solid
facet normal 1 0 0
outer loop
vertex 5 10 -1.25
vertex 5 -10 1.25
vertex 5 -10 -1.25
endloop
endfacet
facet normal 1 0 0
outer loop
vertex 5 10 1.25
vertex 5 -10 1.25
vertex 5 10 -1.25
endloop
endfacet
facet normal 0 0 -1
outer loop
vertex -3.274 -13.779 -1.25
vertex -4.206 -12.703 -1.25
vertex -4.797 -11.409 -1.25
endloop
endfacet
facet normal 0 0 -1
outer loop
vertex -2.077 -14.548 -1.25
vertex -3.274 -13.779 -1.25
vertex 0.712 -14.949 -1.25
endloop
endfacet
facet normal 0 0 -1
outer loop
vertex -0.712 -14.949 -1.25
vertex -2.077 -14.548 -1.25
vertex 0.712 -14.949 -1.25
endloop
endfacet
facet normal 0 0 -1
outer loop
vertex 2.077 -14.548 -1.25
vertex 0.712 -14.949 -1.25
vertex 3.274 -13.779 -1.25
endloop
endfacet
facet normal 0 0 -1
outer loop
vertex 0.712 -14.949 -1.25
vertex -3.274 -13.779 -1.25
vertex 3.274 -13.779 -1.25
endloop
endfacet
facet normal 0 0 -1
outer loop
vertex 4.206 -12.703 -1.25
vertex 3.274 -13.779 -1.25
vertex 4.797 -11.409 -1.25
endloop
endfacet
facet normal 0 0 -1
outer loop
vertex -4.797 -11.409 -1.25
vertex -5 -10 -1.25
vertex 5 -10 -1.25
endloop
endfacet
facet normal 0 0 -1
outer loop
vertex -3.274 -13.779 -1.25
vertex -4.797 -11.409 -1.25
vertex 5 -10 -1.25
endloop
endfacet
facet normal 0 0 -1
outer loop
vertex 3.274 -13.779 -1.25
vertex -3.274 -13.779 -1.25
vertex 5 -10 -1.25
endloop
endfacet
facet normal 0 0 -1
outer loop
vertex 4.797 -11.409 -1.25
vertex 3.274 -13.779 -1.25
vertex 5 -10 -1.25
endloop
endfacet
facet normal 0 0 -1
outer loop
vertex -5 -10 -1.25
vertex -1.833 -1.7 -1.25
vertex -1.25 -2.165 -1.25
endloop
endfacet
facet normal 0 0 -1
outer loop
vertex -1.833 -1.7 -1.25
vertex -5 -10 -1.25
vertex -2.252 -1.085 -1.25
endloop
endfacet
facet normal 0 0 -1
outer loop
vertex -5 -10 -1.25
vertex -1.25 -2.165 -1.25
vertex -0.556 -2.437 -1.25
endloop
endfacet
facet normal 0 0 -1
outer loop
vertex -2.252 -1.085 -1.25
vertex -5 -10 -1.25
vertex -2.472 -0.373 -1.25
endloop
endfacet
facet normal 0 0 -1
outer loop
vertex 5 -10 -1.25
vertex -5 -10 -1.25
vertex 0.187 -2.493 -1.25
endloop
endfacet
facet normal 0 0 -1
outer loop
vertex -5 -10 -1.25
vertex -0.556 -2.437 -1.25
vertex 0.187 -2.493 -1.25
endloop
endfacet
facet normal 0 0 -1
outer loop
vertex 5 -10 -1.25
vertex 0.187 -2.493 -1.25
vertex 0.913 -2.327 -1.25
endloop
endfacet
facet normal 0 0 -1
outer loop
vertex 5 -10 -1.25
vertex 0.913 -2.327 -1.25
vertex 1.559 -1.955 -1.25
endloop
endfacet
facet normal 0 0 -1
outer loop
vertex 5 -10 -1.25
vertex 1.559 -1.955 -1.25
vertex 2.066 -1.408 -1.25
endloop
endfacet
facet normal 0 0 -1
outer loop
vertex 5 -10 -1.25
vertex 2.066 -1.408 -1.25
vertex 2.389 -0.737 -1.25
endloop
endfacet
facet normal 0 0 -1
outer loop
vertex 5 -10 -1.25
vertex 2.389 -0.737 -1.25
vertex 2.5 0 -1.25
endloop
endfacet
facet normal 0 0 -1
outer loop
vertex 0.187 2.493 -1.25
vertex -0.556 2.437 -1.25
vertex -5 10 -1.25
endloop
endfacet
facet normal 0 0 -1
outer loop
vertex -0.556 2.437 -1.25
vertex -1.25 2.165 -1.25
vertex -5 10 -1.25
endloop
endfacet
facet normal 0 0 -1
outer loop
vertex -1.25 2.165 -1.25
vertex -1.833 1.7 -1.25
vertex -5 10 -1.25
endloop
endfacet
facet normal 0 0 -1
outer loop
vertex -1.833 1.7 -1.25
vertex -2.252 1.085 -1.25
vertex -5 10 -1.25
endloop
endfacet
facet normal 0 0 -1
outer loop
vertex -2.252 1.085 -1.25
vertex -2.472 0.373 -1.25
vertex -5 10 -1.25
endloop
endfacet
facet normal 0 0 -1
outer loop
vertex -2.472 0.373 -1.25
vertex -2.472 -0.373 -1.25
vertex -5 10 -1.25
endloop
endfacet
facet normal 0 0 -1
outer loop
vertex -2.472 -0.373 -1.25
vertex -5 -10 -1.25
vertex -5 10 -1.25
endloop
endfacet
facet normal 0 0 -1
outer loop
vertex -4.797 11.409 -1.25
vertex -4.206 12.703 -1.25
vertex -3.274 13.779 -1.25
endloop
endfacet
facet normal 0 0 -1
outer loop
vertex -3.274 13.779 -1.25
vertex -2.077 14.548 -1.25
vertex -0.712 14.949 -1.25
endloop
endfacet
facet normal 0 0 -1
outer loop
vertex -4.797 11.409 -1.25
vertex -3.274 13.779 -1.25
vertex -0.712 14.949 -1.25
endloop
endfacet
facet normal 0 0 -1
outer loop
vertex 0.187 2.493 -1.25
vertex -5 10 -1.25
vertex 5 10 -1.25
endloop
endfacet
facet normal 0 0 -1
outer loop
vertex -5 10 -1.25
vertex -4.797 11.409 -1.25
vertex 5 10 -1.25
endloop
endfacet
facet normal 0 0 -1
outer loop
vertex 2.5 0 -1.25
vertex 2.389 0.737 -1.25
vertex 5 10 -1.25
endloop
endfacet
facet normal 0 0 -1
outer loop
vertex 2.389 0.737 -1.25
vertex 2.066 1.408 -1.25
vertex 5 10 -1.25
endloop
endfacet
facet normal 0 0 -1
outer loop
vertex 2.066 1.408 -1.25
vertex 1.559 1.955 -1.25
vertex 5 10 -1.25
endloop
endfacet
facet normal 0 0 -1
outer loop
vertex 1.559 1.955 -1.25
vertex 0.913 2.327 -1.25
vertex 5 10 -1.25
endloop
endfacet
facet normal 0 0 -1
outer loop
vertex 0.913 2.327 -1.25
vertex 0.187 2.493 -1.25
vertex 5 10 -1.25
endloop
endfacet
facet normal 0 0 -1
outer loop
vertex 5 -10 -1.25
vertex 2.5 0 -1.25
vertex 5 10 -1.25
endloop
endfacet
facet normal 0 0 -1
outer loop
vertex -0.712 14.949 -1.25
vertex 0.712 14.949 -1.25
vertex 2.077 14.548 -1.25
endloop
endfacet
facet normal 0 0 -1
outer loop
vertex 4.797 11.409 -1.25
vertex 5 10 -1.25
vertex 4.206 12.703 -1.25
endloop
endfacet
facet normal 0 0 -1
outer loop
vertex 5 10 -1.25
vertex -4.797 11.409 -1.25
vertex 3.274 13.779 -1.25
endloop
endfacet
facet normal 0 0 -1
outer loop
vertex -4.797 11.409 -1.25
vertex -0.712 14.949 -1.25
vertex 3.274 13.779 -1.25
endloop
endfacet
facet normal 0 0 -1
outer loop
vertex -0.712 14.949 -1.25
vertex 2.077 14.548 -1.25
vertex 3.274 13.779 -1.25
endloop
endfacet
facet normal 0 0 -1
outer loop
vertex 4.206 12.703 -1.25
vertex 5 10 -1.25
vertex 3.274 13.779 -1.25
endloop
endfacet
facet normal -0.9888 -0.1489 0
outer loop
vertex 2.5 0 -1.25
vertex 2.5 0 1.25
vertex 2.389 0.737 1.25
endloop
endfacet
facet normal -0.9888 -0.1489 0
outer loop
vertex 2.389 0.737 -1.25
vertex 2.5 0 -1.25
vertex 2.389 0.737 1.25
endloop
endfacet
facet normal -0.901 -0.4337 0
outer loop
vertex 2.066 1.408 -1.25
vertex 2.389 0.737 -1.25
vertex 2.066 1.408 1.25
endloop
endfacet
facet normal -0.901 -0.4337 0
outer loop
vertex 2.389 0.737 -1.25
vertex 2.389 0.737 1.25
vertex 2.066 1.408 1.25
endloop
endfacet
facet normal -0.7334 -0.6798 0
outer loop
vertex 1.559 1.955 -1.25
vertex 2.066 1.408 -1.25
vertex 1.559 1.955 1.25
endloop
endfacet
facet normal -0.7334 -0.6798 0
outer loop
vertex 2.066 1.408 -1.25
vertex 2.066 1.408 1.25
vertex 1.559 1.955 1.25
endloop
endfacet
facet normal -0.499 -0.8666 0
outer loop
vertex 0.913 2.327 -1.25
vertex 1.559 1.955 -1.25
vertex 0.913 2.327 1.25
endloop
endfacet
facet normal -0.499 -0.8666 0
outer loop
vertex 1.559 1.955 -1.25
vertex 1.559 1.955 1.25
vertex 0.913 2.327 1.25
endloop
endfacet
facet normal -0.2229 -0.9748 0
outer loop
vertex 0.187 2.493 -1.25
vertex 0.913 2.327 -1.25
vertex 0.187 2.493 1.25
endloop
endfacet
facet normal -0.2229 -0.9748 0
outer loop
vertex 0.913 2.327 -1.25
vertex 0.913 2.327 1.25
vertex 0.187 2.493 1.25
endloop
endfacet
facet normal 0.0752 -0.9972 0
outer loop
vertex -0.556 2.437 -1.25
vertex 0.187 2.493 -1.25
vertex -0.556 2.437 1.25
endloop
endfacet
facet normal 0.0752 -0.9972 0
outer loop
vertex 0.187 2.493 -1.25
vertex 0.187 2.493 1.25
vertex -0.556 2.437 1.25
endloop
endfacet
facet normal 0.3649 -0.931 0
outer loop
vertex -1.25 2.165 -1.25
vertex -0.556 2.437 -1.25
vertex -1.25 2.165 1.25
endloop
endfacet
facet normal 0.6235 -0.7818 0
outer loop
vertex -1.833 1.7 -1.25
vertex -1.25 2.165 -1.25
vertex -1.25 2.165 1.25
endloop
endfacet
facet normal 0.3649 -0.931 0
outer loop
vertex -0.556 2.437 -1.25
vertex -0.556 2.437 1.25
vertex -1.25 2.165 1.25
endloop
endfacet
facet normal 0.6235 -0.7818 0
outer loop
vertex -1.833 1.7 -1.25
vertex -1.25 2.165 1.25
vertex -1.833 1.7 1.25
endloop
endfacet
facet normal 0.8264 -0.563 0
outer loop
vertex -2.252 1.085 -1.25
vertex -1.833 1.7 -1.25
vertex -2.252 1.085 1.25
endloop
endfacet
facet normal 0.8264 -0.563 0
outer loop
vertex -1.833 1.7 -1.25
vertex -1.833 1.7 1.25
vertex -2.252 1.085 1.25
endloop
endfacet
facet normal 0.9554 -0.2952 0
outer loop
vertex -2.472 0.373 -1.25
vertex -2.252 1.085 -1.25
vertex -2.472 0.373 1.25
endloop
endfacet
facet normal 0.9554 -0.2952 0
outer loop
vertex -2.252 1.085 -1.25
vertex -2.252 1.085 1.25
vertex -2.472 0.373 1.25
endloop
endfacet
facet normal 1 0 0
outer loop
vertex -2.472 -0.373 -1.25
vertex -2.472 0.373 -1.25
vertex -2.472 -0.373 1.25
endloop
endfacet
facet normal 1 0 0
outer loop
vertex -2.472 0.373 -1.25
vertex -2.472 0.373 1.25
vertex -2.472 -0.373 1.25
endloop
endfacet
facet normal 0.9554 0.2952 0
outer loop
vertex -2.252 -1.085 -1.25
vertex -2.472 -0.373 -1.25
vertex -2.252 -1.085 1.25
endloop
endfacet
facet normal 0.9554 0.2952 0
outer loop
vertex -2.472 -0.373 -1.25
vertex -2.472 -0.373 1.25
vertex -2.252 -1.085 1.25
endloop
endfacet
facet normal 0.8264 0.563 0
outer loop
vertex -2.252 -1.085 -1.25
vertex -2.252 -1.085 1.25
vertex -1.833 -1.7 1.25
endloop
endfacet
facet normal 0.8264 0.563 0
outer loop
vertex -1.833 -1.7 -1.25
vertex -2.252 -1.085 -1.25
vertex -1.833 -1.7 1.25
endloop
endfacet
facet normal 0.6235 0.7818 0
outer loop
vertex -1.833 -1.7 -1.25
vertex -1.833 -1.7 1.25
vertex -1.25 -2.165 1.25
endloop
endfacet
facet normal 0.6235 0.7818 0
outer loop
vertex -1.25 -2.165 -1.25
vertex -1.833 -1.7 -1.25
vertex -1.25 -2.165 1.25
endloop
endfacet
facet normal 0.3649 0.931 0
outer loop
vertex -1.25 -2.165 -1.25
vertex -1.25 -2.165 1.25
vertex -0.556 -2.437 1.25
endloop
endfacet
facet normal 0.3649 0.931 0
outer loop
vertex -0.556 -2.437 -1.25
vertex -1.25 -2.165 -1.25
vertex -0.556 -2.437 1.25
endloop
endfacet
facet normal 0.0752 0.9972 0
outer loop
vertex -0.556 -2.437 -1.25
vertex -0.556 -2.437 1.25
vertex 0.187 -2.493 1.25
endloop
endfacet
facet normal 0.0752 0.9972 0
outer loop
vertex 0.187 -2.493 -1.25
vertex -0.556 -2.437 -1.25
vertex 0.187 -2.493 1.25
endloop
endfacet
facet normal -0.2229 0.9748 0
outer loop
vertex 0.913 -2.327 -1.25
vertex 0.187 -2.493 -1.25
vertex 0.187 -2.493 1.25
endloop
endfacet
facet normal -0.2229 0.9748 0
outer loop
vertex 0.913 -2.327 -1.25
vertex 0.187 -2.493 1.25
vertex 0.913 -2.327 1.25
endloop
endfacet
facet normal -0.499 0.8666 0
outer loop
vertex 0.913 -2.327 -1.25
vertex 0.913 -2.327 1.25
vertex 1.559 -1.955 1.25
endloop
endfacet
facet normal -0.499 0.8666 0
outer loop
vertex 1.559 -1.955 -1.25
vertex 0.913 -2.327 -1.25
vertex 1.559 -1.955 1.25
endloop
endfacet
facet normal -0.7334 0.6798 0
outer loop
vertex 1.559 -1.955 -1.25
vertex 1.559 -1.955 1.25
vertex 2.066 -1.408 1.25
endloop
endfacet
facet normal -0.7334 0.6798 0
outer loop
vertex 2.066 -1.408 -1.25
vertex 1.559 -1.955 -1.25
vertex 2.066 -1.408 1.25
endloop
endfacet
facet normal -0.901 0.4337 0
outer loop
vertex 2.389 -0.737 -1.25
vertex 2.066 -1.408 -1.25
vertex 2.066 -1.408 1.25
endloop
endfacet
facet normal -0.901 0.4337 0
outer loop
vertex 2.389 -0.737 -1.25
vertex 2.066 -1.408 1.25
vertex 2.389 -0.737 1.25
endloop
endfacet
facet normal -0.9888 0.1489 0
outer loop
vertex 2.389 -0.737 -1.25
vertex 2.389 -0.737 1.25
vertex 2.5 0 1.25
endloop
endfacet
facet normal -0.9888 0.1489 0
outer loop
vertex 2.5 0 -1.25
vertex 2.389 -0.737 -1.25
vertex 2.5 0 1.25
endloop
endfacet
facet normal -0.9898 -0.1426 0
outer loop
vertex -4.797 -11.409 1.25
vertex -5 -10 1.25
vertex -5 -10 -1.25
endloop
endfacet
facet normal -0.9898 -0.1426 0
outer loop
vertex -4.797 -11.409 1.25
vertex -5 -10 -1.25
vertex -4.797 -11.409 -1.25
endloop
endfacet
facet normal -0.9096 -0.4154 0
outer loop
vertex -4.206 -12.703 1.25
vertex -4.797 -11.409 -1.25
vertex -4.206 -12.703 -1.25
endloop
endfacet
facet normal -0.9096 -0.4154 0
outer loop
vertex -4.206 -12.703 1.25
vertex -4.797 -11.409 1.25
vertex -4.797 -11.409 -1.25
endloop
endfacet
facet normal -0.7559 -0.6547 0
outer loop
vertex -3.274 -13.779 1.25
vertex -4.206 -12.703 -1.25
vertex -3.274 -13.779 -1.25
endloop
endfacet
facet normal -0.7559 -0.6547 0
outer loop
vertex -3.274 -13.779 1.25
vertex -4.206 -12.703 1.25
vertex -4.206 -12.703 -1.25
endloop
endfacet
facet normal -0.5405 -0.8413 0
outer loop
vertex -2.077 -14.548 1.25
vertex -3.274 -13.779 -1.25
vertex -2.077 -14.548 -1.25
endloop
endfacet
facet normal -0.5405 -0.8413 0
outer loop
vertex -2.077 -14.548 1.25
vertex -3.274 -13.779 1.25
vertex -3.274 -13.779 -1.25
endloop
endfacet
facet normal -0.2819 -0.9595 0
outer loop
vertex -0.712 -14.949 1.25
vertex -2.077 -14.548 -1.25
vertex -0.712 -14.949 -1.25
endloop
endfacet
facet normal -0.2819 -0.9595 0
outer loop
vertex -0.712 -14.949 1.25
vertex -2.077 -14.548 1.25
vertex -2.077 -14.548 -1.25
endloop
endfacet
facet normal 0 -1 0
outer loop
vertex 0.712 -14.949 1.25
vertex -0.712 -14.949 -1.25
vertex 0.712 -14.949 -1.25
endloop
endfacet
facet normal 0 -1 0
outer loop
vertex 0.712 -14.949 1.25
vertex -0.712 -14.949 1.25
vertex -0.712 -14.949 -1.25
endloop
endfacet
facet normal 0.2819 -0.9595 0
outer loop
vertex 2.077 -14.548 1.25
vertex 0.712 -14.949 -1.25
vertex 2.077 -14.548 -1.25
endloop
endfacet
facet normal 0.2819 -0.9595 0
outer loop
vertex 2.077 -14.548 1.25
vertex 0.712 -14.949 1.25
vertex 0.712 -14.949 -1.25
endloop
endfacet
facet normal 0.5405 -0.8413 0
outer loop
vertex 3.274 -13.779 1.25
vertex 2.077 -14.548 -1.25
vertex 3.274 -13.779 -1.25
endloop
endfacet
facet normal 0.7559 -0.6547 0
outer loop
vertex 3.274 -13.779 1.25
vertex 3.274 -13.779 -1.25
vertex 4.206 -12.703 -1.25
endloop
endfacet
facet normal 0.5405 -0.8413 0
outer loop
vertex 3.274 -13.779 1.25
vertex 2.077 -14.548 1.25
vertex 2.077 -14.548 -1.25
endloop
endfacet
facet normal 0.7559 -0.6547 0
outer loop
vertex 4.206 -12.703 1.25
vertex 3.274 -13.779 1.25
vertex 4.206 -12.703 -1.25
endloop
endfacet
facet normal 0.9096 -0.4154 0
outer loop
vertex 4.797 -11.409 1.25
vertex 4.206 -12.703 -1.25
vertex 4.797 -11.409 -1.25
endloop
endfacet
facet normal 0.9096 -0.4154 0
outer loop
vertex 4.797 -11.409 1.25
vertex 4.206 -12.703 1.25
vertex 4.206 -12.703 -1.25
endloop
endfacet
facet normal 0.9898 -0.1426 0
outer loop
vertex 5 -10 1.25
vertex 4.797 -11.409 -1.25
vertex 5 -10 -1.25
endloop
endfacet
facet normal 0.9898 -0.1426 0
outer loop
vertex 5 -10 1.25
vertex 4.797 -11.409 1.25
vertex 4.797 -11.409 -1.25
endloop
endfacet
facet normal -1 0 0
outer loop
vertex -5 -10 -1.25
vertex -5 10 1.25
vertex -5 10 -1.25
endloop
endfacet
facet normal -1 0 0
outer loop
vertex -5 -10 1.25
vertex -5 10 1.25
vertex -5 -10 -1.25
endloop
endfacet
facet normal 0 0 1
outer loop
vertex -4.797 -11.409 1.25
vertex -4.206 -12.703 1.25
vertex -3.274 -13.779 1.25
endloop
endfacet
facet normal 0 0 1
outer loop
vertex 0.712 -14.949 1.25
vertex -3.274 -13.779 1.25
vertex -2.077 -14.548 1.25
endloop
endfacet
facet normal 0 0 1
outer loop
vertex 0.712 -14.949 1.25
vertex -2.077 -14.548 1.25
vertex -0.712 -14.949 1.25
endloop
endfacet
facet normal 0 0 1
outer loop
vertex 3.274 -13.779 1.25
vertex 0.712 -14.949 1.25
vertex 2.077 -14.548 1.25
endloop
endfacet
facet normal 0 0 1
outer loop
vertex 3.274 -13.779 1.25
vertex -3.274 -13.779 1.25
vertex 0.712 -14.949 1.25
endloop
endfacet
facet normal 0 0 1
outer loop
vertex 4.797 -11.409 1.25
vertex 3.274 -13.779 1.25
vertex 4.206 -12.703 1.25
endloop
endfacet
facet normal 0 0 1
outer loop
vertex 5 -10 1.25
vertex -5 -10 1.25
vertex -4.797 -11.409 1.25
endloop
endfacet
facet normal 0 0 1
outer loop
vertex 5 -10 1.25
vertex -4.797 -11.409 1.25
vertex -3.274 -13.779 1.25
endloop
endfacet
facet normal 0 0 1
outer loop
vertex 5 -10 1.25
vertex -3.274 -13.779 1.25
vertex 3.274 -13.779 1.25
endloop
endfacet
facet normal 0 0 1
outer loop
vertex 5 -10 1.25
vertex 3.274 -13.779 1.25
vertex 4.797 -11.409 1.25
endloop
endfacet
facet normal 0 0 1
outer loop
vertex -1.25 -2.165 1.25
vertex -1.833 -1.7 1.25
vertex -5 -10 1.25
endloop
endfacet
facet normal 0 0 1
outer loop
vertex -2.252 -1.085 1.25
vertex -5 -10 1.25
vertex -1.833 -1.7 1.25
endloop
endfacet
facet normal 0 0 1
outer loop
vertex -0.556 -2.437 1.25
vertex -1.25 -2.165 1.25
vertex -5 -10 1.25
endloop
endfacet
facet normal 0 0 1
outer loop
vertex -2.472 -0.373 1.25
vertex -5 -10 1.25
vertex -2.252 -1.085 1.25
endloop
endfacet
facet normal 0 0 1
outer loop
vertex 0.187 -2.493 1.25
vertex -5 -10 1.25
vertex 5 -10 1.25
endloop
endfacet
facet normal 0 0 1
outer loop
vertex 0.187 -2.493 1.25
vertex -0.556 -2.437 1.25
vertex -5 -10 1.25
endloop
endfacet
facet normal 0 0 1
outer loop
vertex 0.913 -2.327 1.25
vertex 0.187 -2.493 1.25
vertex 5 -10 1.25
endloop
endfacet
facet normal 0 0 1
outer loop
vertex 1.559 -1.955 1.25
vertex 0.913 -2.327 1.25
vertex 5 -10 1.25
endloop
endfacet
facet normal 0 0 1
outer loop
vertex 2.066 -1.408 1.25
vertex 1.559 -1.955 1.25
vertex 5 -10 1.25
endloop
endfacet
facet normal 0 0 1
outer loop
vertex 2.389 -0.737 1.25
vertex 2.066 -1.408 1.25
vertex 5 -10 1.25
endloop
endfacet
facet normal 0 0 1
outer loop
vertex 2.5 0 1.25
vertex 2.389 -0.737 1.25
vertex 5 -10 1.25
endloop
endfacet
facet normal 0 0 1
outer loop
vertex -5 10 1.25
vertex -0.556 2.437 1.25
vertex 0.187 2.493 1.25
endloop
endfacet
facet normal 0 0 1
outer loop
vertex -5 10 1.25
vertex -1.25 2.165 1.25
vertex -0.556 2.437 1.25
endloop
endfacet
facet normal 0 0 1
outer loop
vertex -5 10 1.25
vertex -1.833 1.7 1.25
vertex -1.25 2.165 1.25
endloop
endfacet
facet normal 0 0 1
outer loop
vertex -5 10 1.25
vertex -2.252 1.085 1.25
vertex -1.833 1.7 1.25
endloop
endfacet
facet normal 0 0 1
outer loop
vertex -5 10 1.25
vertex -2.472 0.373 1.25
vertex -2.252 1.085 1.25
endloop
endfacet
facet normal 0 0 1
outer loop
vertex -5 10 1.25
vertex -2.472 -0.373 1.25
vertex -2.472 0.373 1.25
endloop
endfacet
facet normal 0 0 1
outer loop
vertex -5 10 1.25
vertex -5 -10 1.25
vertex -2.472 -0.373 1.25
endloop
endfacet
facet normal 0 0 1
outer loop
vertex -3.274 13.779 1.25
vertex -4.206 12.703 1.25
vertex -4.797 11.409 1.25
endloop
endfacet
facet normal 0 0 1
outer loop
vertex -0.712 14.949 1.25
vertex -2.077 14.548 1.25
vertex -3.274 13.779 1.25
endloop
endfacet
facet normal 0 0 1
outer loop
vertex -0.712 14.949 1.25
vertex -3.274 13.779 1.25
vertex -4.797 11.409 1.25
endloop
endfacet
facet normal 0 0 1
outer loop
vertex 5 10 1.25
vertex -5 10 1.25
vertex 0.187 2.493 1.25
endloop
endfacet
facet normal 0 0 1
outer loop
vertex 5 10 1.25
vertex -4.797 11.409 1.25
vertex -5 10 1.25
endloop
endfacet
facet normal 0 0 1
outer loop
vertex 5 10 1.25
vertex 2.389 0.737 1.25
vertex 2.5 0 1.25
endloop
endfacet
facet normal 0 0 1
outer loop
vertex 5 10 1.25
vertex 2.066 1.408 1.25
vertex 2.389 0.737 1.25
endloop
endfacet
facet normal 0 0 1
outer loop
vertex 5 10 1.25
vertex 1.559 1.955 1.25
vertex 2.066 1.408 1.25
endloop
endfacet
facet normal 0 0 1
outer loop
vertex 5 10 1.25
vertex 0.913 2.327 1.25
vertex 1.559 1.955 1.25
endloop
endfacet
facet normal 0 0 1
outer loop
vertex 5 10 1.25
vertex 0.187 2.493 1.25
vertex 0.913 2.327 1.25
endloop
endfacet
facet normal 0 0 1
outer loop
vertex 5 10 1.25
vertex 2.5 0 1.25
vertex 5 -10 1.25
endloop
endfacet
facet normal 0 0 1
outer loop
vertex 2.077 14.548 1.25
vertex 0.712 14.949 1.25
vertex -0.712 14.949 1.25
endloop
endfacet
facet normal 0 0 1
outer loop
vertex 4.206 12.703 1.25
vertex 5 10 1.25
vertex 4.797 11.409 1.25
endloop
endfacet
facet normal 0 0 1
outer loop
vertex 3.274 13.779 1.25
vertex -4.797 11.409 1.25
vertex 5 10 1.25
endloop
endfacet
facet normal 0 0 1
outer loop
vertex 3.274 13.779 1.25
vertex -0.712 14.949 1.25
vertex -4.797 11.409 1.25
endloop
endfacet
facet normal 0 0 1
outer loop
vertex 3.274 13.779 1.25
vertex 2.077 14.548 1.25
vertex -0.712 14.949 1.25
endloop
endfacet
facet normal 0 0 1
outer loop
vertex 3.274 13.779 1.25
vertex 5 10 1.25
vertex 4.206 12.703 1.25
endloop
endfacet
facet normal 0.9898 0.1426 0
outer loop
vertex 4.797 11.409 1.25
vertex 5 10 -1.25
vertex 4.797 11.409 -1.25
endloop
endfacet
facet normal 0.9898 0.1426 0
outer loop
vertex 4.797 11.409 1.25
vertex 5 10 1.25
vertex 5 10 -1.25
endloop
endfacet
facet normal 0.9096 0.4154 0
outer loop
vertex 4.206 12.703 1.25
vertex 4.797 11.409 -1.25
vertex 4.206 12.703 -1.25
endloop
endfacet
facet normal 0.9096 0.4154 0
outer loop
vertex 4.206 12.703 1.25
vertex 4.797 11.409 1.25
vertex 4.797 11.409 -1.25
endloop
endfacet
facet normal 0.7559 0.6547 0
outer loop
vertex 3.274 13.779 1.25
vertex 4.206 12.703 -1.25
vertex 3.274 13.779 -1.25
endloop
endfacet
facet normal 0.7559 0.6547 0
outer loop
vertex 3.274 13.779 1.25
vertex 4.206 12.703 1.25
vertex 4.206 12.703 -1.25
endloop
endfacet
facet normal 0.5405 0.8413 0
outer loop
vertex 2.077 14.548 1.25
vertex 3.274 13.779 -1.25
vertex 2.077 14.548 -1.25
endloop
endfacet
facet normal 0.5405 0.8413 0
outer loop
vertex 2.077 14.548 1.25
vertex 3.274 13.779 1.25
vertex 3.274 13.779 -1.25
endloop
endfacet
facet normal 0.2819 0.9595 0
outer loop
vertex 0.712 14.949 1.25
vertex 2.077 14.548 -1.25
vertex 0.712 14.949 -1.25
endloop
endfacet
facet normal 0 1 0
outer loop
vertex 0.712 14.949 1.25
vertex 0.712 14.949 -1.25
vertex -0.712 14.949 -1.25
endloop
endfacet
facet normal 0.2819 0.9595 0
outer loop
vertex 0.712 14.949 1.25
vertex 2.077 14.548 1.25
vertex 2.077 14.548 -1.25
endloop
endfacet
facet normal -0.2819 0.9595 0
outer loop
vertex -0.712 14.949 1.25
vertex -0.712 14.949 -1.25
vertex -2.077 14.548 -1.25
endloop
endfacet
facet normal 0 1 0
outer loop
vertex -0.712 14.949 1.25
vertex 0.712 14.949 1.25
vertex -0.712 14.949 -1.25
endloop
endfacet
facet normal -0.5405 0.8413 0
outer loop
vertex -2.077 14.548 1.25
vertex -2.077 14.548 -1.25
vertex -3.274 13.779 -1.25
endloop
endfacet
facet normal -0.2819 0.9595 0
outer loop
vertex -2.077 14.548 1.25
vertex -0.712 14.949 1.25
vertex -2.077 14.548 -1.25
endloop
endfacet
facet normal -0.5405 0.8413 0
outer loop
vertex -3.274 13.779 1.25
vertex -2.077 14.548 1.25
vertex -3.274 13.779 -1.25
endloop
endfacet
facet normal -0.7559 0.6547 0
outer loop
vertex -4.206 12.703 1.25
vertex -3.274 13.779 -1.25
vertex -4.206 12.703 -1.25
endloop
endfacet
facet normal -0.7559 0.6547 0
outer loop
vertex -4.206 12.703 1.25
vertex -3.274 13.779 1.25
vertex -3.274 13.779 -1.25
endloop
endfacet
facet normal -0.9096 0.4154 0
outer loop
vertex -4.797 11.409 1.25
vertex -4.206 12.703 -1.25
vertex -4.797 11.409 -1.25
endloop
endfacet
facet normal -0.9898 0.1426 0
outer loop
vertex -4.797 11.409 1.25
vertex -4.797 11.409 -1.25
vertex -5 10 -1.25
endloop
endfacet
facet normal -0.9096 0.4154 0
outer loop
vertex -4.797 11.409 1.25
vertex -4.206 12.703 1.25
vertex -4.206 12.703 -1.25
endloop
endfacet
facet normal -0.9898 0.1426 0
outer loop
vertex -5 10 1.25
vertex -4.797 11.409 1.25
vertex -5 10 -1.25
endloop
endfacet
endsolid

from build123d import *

# Parameters (mm, degrees)
F1_DEPTH = 1.25
F2_R     = 2.5
F3_DEPTH = 2.501


# Not quite as in the source:
# - a feature names something its author has since deleted; it is built from what else it names


with BuildPart() as f1:
    # F0 (on Top) → F1 (new body, symmetric)
    with BuildSketch(Plane.XY):
        with BuildLine():
            Line((-5, 10), (-5, 0))
            Line((-5, 0), (5, 0))
            Line((5, 0), (5, 10))
            ThreePointArc((5, 10), (0, 5), (-5, 10))
        make_face()
        with BuildLine():
            Line((5, 0), (-5, 0))
            Line((-5, 0), (-5, -10))
            ThreePointArc((-5, -10), (0, -5), (5, -10))
            Line((5, -10), (5, 0))
        make_face()
        with BuildLine():
            ThreePointArc((5, 10), (0, 15), (-5, 10))
            ThreePointArc((-5, 10), (0, 5), (5, 10))
        make_face()
        with BuildLine():
            ThreePointArc((5, -10), (0, -5), (-5, -10))
            ThreePointArc((-5, -10), (0, -15), (5, -10))
        make_face()
    extrude(amount=F1_DEPTH, both=True)

    # F2 (on face) → F3 (cut, through all)
    with BuildSketch(Plane.XY.offset(1.25)):
        Circle(F2_R)
    extrude(amount=-F3_DEPTH, mode=Mode.SUBTRACT)


solid = f1.part
